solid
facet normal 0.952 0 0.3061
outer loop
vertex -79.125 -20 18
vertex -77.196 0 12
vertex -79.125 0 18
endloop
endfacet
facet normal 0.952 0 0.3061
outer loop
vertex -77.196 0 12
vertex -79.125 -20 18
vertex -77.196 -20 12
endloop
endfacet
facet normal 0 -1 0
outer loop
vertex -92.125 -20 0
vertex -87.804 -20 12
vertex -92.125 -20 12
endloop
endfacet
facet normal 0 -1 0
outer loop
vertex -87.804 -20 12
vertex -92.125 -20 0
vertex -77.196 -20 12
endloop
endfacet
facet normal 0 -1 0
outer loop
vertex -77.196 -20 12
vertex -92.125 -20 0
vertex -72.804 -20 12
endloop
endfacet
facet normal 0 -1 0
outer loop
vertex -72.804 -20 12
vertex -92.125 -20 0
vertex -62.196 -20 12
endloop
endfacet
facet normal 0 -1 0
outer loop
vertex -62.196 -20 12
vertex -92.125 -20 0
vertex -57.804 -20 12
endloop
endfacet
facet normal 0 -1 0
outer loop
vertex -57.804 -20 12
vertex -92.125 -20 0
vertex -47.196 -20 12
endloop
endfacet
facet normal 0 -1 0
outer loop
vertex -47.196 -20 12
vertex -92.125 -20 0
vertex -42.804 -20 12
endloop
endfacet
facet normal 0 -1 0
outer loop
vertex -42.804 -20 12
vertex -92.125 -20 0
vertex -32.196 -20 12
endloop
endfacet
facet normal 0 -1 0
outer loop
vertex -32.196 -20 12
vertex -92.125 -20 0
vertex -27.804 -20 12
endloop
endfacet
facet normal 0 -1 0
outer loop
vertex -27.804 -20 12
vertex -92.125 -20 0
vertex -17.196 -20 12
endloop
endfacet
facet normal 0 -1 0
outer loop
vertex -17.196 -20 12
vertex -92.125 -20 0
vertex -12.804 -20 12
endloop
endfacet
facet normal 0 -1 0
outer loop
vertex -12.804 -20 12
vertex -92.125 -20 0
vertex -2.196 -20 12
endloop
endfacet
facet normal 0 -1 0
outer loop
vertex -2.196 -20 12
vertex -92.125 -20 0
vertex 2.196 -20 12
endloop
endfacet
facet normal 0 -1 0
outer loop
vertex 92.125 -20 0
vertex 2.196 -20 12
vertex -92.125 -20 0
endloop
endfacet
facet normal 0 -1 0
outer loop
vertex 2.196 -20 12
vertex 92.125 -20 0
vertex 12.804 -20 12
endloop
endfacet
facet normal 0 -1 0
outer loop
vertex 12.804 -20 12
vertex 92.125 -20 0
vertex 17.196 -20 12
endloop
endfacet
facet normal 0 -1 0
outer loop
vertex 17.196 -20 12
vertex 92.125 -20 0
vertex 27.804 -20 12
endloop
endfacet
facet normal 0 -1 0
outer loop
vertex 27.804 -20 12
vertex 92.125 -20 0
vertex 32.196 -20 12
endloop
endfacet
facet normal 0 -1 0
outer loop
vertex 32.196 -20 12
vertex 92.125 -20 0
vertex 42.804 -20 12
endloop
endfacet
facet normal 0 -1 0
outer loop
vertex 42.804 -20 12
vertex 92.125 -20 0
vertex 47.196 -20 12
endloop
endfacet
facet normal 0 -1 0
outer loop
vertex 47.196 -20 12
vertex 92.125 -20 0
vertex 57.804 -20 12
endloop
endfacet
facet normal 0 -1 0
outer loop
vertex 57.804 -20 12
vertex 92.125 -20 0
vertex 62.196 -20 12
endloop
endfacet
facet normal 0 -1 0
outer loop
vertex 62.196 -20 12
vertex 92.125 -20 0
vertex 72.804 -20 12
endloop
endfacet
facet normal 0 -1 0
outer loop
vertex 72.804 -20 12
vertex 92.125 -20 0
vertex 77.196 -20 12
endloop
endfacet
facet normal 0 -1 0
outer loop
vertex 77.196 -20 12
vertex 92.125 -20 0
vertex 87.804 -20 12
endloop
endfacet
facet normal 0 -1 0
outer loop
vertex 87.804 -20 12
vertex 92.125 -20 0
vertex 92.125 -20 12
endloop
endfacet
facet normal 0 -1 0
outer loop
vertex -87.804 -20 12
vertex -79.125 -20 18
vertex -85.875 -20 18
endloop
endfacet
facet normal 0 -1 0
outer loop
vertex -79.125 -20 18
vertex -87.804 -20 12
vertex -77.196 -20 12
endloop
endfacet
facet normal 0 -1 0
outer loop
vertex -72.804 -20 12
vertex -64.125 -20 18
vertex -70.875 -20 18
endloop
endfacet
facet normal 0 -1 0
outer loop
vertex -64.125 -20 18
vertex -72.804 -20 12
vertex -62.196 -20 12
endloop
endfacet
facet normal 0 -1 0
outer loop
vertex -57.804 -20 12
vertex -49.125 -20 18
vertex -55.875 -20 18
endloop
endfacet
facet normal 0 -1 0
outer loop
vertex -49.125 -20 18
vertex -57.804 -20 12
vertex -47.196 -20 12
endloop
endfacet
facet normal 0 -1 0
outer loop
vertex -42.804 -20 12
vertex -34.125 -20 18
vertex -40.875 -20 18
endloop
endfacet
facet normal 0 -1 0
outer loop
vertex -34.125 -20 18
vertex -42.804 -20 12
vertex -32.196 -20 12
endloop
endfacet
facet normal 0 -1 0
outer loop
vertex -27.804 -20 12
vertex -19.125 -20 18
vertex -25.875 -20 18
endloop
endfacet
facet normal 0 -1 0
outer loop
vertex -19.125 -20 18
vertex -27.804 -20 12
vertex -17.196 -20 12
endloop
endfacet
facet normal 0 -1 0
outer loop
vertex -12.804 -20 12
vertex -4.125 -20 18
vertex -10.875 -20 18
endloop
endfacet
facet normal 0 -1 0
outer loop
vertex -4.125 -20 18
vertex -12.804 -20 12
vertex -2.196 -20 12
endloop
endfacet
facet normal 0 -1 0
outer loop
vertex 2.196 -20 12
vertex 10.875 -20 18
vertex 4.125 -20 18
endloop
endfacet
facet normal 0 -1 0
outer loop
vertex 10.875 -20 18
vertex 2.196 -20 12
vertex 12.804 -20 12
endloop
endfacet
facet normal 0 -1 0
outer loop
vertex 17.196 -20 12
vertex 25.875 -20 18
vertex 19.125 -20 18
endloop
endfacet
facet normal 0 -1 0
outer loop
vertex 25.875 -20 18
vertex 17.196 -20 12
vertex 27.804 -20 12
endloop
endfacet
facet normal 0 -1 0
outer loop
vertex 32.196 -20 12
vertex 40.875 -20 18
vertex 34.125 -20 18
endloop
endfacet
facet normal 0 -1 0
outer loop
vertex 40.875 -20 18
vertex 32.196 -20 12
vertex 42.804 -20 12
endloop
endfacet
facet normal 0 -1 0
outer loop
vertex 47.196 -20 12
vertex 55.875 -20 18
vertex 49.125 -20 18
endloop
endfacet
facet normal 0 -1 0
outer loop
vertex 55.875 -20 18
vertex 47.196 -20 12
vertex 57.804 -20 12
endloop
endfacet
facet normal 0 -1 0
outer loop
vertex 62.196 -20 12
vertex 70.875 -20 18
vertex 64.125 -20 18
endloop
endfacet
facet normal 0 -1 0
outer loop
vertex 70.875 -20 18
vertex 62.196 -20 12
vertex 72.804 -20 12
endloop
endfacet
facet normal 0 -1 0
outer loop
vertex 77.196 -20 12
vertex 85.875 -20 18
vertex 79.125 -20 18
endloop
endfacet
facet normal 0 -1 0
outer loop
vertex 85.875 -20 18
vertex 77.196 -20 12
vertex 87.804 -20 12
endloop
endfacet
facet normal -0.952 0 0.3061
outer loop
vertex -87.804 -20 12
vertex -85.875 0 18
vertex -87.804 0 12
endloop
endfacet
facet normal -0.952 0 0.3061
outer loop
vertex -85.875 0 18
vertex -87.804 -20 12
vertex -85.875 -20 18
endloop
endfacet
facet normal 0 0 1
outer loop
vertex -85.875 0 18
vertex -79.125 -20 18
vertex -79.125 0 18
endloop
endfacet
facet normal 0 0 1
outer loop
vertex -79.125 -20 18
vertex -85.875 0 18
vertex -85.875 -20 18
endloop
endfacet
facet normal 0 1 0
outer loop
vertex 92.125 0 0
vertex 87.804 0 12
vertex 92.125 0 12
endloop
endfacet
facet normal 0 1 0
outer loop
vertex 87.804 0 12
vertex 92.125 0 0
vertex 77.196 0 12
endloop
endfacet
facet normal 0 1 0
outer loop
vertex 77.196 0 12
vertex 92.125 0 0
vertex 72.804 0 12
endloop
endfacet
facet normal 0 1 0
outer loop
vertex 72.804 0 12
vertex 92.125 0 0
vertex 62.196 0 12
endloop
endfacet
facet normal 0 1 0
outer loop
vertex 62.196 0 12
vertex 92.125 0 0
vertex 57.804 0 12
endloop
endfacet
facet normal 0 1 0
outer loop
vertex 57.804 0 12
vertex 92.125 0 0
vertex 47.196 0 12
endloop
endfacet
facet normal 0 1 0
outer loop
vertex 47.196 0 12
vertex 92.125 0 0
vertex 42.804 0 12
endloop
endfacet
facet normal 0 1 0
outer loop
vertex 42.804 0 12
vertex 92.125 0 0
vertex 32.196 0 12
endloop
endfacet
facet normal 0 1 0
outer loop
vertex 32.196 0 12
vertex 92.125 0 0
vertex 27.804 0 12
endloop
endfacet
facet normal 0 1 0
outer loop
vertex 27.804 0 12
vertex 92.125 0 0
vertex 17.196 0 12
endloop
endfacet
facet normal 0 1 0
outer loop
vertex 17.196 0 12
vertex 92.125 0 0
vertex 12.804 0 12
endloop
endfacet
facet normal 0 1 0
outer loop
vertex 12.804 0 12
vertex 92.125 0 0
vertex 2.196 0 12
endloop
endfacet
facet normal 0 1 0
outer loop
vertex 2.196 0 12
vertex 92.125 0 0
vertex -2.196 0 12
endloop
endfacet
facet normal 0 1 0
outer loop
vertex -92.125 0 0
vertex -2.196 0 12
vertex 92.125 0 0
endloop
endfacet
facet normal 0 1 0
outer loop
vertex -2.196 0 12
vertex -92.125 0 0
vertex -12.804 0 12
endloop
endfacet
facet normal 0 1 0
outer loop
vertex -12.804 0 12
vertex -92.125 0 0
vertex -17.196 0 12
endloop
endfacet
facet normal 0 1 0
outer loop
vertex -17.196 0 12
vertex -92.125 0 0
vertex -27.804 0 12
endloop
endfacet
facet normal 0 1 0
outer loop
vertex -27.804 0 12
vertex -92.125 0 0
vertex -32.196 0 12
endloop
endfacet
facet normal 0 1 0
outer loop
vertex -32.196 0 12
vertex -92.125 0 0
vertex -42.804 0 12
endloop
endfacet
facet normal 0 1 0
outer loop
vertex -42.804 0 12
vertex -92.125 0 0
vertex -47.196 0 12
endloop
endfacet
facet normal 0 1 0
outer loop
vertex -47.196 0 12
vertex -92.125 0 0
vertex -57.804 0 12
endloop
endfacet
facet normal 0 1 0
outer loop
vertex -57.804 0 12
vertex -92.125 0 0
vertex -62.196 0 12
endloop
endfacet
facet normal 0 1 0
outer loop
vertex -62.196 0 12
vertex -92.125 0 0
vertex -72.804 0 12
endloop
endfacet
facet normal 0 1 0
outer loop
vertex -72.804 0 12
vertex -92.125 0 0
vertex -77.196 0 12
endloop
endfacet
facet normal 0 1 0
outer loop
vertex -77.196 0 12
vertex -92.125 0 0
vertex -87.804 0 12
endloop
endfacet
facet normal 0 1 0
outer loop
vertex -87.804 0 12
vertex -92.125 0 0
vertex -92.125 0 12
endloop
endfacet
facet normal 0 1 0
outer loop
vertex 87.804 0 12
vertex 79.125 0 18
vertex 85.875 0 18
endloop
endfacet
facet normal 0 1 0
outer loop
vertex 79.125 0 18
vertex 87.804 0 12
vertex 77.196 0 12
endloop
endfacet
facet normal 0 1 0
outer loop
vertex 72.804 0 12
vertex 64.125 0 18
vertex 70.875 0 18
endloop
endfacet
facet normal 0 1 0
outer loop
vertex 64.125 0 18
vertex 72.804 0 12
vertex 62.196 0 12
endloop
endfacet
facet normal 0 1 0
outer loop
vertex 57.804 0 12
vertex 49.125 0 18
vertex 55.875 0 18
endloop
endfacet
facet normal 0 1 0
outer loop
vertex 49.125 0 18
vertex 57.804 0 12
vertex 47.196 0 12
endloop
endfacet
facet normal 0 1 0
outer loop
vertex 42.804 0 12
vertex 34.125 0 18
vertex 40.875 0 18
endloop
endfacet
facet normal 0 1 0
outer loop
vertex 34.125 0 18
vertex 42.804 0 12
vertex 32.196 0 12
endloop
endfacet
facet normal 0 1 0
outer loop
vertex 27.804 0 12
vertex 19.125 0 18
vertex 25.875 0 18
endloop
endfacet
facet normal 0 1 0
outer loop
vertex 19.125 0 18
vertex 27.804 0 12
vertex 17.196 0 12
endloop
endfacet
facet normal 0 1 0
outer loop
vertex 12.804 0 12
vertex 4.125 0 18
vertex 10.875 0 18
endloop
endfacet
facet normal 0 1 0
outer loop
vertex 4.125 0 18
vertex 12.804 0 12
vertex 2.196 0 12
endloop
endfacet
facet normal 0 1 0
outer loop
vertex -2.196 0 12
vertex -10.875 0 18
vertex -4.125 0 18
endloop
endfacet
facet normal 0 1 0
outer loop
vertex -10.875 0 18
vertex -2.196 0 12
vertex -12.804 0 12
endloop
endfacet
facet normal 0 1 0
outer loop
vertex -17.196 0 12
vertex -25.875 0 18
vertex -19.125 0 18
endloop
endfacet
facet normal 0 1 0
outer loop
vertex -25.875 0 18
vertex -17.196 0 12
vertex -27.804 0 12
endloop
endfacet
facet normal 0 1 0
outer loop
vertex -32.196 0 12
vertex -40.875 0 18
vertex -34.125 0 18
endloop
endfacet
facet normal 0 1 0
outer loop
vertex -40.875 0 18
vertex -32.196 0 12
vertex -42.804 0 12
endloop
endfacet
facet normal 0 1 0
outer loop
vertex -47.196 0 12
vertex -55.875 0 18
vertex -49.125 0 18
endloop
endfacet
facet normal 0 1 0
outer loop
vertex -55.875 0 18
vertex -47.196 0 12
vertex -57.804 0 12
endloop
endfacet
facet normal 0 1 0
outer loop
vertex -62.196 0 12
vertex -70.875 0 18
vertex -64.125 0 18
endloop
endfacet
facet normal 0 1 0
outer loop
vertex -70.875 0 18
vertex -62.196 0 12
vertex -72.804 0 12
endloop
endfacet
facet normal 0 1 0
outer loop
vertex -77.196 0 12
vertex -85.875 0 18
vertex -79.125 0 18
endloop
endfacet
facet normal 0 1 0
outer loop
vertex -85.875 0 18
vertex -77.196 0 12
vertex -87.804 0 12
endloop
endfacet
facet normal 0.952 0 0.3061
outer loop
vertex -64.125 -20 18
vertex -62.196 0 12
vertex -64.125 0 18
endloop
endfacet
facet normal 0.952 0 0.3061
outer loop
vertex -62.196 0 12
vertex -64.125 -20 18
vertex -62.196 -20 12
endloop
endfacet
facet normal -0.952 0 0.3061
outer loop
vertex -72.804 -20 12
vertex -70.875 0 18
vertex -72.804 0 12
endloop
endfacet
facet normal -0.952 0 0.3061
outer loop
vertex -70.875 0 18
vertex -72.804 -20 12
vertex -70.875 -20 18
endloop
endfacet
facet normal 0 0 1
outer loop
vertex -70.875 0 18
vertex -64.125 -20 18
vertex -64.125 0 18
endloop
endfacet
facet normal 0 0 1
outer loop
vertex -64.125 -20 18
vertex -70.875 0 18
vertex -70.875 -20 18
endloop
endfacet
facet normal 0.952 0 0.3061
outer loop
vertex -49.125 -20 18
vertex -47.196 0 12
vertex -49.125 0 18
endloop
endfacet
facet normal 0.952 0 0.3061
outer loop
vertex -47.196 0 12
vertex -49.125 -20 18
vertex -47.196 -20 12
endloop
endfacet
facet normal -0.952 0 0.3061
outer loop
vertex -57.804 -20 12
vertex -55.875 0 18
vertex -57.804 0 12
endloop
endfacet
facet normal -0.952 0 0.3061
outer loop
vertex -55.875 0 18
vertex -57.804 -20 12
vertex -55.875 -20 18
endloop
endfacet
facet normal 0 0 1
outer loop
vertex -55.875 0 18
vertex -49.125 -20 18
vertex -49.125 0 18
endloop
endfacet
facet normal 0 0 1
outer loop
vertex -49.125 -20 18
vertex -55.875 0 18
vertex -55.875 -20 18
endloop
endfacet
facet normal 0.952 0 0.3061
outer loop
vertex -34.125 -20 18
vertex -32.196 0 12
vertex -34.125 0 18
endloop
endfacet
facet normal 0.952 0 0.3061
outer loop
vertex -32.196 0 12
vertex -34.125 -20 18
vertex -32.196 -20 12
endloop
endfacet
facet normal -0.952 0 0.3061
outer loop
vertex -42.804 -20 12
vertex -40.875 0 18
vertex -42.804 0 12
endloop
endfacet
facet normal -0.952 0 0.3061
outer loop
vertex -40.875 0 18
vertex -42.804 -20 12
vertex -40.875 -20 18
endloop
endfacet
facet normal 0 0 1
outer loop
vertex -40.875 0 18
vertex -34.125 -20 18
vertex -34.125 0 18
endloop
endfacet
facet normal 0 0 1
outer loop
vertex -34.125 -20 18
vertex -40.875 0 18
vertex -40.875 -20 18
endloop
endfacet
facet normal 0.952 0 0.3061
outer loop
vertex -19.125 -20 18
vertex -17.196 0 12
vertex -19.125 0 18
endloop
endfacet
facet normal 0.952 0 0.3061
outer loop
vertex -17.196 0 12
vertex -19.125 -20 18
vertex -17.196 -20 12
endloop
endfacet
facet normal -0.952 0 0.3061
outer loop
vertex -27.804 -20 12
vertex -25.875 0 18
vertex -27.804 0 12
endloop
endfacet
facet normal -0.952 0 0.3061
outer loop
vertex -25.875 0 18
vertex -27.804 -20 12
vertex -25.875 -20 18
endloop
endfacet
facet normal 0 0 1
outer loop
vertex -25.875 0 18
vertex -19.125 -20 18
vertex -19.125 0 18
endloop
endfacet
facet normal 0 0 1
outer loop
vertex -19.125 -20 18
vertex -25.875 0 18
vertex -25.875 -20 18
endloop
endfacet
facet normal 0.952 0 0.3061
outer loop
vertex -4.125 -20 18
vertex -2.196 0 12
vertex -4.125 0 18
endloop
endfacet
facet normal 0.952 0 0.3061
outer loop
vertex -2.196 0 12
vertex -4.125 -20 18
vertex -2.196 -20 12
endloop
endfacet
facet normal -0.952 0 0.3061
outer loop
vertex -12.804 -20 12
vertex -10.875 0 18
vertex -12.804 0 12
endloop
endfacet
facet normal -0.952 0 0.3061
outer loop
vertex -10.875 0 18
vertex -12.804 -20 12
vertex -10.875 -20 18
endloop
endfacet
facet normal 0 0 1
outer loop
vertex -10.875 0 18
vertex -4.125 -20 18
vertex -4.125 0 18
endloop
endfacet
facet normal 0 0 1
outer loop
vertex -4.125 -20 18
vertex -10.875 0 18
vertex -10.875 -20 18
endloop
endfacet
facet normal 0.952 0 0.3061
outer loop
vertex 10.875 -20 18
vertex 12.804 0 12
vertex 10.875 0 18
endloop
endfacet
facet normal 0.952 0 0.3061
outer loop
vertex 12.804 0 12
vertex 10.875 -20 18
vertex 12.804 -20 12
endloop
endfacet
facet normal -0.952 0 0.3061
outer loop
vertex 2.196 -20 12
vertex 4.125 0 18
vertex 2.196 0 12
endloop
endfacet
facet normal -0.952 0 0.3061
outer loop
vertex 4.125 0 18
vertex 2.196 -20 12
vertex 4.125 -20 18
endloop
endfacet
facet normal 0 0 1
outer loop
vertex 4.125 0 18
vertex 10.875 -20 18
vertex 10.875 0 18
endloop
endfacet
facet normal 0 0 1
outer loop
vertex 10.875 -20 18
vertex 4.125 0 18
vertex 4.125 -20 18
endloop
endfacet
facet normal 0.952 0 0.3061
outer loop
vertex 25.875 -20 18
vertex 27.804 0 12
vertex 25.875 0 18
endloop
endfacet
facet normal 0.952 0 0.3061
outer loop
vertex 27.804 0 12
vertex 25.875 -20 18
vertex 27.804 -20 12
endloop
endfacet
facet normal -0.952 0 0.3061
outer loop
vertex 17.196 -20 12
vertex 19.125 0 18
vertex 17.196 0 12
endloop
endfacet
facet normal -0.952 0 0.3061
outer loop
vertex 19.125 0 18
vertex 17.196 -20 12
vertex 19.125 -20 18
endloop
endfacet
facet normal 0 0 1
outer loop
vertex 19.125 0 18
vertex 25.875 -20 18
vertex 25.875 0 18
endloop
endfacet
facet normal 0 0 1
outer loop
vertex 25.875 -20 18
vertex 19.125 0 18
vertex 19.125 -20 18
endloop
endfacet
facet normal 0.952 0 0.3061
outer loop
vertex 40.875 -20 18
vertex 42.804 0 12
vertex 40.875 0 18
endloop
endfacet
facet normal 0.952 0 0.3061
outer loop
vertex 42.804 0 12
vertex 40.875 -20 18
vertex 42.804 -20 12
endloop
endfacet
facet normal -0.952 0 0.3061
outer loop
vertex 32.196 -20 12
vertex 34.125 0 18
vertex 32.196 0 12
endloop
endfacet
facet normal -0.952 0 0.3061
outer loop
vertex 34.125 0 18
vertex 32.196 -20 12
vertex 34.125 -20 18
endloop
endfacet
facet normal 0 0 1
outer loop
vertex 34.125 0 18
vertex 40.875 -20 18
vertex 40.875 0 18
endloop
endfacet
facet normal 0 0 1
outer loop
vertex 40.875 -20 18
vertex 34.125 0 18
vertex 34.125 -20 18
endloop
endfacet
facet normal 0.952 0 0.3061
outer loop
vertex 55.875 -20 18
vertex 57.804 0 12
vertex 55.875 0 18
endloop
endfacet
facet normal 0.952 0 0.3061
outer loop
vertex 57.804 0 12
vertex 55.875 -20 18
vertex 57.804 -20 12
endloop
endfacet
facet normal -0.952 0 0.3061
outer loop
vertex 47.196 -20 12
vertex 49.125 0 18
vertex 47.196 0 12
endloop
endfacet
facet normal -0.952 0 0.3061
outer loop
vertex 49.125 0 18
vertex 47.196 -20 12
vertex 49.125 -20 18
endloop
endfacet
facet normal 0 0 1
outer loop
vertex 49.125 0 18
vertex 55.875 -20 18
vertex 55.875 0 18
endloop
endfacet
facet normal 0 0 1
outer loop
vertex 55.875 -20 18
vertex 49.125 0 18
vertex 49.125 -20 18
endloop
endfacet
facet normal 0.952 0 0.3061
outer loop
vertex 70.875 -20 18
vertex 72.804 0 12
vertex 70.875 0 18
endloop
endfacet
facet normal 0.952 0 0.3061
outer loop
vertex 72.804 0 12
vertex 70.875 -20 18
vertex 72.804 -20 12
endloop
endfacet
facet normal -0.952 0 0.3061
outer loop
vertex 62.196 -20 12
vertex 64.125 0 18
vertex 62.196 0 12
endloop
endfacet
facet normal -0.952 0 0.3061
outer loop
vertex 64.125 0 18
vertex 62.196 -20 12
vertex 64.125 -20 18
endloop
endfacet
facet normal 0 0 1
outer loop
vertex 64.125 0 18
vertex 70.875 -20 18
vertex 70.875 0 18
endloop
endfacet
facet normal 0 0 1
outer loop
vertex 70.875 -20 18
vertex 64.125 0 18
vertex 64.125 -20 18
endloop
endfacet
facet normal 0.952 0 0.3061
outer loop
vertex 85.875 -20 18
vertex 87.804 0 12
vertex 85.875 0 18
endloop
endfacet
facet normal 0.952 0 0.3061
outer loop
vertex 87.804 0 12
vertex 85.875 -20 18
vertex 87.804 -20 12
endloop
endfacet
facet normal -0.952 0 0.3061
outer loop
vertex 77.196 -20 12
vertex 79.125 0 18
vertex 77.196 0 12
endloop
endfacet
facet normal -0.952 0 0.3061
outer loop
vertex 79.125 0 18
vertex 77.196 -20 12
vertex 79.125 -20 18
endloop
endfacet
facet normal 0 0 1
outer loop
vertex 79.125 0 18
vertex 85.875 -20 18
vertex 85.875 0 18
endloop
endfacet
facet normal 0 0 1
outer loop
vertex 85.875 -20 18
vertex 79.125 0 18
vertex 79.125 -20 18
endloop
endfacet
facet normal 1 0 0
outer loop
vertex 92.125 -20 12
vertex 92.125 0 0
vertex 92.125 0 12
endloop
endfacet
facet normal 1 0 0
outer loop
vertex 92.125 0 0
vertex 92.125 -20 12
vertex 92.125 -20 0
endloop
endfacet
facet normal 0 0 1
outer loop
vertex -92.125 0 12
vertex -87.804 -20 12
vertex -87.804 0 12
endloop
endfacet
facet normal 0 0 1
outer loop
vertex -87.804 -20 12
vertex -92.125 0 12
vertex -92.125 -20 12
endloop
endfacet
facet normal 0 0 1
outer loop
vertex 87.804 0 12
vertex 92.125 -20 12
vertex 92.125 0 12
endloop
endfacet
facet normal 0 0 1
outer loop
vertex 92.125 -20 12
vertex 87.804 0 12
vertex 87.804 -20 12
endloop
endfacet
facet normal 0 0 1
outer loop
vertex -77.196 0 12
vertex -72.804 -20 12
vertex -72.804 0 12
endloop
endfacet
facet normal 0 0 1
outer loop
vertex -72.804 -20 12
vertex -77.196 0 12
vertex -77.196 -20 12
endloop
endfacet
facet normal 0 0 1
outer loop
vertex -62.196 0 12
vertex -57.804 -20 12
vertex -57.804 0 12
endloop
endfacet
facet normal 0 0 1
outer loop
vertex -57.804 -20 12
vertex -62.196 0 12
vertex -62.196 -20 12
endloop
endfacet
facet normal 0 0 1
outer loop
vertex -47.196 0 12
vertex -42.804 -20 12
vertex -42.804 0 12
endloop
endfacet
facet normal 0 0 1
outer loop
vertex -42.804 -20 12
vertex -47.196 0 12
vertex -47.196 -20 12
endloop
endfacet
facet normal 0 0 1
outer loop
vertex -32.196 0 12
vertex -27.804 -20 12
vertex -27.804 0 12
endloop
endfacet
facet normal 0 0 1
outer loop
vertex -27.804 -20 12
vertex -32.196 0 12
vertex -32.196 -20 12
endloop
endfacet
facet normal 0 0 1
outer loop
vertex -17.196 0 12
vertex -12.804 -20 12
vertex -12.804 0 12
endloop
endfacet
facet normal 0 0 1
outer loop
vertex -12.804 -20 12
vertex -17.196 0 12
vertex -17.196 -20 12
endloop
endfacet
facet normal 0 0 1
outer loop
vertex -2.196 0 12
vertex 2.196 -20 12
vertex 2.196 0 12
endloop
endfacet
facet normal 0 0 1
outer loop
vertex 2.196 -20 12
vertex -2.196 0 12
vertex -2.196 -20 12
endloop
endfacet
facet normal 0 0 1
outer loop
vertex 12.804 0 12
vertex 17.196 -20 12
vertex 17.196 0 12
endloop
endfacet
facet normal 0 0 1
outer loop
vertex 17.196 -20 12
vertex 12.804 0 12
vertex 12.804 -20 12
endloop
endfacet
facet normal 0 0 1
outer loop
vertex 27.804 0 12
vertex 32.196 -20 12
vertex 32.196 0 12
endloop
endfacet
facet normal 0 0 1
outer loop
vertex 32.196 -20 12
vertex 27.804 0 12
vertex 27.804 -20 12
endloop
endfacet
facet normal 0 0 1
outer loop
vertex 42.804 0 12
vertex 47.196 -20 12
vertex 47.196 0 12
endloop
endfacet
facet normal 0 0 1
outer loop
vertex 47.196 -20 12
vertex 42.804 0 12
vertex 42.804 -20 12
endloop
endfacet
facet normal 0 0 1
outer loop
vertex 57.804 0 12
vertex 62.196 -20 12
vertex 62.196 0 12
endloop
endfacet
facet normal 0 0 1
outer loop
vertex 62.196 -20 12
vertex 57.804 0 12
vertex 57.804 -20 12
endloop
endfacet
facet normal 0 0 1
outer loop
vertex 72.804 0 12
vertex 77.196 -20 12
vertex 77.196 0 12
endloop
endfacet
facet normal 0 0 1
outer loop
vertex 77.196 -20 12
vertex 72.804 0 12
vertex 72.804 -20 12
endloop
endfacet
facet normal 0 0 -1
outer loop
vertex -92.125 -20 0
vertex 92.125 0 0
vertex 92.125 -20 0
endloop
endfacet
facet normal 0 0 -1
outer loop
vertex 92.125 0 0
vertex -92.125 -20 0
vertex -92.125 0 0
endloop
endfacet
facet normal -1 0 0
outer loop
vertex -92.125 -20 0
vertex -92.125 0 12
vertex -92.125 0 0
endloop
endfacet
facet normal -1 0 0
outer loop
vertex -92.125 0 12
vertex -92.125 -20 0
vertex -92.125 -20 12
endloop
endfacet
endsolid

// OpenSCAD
$fn = 32;

// ----------------------------------------------------------------------
// Toothed rack, 12 teeth
// 15 mm pitch, 6 mm teeth
// ----------------------------------------------------------------------

// --- parameters (mm) ---
bar_w = 20;      // bar width (Y)
bar_h = 12;      // bar height (Z)
teeth = 12;      // number of teeth
pitch = 15;      // tooth pitch
tooth_h = 6;     // tooth height above the bar
root_w = 11.25;  // tooth width at the root
crest_w = 6.75;  // tooth width at the crest

// --- derived feature positions (mm) ---
span = (teeth - 1) * pitch;  // = 165   distance between the outer teeth
bar_l = span + root_w + 8;   // = 184.25   bar length: teeth plus 4 mm at each end
tooth_x = -span / 2;         // = -82.5   X of the first tooth
height = bar_h + tooth_h;    // = 18   overall height
feature_centers = [
  [tooth_x + 0 * pitch, -bar_w / 2],
  [tooth_x + 1 * pitch, -bar_w / 2],
  [tooth_x + 2 * pitch, -bar_w / 2],
  [tooth_x + 3 * pitch, -bar_w / 2],
  [tooth_x + 4 * pitch, -bar_w / 2],
  [tooth_x + 5 * pitch, -bar_w / 2],
  [tooth_x + 6 * pitch, -bar_w / 2],
  [tooth_x + 7 * pitch, -bar_w / 2],
  [tooth_x + 8 * pitch, -bar_w / 2],
  [tooth_x + 9 * pitch, -bar_w / 2],
  [tooth_x + 10 * pitch, -bar_w / 2],
  [tooth_x + 11 * pitch, -bar_w / 2]
];   // tooth centre line, drives the tooth loop

// bar with a rack of teeth, one extruded trapezoium per centre
module rack_tooth() {
  linear_extrude(height = bar_w)
    polygon(points = [
      [0, 0],
      [root_w, 0],
      [root_w / 2 + crest_w / 2, tooth_h + 1],
      [root_w / 2 - crest_w / 2, tooth_h + 1]
    ]);
}

union() {
  translate([-bar_l / 2, -bar_w, 0]) cube([bar_l, bar_w, bar_h]);
  for (centre = feature_centers)
    translate([centre[0] - root_w / 2, 0, bar_h - 1]) rotate([90, 0, 0]) rack_tooth();
}
